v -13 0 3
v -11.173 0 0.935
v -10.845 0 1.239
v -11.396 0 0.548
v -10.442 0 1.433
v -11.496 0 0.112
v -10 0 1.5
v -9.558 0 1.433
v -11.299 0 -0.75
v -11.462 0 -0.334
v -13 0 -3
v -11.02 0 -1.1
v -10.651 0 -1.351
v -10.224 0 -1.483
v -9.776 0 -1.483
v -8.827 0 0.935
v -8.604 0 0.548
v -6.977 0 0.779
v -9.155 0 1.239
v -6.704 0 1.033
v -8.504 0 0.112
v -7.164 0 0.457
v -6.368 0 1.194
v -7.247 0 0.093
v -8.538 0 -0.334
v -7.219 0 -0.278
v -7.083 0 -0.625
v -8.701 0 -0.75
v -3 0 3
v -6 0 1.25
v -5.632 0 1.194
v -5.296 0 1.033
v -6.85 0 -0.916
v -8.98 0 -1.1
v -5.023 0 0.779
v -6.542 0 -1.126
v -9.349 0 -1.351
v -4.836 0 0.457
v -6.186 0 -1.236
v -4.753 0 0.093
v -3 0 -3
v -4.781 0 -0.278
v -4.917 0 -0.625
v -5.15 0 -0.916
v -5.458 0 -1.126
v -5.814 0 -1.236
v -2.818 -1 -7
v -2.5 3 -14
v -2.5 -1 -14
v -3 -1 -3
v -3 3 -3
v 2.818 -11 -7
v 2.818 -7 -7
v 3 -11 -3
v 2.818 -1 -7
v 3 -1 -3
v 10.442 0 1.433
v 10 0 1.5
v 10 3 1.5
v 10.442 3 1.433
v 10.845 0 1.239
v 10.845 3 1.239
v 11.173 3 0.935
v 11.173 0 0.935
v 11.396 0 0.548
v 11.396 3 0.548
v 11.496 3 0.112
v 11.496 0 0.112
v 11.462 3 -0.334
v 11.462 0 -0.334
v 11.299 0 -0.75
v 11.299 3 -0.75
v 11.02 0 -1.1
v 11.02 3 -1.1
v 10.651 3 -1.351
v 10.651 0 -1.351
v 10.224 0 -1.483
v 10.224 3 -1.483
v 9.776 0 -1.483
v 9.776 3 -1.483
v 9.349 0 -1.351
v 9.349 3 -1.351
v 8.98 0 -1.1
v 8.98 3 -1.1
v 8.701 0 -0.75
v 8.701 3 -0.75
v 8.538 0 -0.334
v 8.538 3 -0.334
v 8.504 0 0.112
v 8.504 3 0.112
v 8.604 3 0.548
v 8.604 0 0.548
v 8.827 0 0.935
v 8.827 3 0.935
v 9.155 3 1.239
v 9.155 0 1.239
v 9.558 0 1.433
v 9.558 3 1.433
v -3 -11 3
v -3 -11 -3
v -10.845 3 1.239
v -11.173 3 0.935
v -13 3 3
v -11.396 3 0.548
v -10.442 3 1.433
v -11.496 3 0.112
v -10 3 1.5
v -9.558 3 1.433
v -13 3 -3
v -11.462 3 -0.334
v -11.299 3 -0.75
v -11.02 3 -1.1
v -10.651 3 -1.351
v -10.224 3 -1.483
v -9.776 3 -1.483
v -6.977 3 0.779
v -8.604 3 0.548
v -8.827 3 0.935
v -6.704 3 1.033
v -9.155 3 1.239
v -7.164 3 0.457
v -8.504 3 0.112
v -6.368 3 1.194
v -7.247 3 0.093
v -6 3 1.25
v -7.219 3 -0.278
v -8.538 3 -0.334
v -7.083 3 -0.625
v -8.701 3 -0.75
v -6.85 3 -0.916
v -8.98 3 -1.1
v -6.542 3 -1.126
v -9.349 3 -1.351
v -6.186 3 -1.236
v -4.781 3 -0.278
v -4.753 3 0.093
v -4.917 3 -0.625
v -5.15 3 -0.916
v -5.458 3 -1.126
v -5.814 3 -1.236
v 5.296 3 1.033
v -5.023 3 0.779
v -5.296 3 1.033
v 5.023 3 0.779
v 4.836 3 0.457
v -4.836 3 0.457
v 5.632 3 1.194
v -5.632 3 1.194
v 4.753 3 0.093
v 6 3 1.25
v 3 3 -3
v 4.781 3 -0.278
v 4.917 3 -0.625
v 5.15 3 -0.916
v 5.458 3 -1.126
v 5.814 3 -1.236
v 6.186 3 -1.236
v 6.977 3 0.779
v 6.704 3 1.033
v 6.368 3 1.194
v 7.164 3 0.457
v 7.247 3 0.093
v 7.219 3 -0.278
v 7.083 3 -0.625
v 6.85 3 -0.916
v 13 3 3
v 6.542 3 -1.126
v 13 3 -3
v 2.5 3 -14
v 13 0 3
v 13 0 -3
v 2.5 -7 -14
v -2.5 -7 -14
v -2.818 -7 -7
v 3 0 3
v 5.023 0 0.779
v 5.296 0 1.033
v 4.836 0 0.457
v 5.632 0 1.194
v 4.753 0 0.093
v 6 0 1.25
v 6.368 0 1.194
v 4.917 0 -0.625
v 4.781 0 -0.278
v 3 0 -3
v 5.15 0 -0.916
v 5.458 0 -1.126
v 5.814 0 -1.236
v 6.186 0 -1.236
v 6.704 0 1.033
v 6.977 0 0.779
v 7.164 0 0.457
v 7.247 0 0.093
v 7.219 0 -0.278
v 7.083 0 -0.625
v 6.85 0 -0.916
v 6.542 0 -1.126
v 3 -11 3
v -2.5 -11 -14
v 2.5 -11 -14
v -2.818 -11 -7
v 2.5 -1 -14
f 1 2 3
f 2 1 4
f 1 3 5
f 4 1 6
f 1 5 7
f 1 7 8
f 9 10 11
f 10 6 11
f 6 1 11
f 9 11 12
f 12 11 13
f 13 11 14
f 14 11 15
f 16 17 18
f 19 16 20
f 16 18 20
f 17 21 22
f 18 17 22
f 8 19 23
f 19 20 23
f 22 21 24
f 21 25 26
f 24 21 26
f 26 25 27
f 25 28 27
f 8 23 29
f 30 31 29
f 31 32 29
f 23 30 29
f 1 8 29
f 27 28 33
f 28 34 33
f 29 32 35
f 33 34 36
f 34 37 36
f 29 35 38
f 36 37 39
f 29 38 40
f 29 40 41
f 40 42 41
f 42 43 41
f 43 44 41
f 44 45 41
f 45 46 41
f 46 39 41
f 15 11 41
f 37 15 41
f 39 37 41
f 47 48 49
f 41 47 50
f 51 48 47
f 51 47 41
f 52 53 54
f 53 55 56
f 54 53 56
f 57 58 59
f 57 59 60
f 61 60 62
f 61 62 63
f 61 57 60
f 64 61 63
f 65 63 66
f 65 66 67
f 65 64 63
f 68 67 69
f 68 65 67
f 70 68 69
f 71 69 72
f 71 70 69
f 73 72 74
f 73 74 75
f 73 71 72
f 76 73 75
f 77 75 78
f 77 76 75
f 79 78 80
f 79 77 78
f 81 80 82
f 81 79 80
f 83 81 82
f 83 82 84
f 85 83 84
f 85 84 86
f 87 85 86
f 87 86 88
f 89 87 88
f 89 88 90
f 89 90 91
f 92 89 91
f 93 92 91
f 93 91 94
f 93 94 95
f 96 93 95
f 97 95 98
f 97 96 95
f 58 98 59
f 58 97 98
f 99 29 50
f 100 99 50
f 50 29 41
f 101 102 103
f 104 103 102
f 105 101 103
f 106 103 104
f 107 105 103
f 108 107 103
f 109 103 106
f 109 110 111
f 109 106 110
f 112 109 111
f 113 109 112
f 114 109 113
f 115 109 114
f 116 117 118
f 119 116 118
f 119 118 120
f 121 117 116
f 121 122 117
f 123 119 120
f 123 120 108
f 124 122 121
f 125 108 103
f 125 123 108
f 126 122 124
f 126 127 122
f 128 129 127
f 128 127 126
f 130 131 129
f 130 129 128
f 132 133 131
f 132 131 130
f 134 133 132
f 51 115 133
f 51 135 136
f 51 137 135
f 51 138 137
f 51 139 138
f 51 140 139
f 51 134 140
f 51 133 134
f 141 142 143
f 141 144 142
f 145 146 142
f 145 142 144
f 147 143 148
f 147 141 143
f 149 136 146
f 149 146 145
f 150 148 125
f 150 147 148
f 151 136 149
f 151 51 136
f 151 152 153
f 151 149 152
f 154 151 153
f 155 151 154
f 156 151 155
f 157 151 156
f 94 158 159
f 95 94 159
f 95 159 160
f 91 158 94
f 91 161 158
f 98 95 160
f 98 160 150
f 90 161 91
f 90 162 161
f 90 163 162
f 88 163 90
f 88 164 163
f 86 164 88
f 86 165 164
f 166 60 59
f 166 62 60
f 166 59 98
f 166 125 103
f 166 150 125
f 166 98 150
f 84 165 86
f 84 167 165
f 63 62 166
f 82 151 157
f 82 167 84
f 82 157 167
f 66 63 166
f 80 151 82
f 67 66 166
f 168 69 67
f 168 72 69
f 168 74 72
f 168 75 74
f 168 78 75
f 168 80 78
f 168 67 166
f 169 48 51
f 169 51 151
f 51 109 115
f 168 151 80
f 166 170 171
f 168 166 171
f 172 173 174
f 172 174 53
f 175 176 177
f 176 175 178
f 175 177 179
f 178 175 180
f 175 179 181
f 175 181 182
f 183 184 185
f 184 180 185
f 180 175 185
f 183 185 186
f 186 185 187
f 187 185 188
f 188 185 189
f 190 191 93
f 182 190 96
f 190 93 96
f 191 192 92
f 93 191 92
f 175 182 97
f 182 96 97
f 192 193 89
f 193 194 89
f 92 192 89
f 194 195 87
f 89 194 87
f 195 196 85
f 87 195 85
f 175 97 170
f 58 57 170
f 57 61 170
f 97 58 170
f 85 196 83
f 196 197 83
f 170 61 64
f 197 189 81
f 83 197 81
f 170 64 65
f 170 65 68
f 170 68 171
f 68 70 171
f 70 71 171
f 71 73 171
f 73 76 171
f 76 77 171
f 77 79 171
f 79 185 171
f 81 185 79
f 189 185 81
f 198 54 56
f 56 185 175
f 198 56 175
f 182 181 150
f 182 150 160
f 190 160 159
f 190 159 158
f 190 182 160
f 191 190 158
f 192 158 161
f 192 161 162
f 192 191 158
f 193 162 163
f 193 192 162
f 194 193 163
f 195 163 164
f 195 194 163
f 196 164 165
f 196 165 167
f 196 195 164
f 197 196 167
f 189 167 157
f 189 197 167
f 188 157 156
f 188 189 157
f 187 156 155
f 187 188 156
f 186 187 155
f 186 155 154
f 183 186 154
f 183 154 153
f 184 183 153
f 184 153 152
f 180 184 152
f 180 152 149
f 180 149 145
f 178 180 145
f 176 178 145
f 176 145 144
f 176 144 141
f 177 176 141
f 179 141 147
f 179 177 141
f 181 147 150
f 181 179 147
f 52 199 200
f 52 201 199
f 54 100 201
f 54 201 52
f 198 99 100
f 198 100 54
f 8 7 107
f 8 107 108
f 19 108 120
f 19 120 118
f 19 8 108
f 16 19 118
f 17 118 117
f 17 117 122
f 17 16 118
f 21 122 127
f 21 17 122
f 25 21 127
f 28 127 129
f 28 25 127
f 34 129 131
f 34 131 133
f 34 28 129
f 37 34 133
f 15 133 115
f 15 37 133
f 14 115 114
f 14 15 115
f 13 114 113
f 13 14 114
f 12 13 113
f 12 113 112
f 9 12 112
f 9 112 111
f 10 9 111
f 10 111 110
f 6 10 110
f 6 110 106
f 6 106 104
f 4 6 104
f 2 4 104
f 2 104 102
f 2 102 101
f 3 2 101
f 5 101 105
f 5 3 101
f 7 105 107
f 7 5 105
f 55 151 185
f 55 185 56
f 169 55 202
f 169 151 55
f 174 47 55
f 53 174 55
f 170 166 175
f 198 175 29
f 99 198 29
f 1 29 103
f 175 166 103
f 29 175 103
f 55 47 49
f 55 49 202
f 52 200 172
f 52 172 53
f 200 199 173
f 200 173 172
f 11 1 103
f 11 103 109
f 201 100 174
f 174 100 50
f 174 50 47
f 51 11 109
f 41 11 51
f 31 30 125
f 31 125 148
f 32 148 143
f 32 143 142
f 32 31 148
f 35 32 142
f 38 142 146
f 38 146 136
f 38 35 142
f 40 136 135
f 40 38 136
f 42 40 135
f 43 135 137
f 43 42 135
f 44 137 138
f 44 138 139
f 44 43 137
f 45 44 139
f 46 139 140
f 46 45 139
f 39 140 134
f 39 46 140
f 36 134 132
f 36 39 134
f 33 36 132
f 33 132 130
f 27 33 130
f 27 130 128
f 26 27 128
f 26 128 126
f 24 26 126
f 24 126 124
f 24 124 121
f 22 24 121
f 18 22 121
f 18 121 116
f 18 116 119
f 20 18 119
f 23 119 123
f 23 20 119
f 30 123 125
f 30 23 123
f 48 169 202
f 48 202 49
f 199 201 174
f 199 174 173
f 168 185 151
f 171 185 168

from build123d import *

# Parameters (mm, degrees)
SKETCH_1_W      = 26
SKETCH_1_H      = 6
SKETCH_1_R      = 1.5
SKETCH_1_R_2    = 1.25
EXTRUDE_1_DEPTH = 3
EXTRUDE_2_DEPTH = 4
EXTRUDE_3_DEPTH = 11
EXTRUDE_4_DEPTH = 4


with BuildPart() as part:
    # 草图1 → 凸台-拉伸1 (new body)
    with BuildSketch(Plane(origin=(0, 0, 0), x_dir=(1, 0, 0), z_dir=(0, 1, 0))):
        Rectangle(SKETCH_1_W, SKETCH_1_H)
        with Locations(Location((-10, 0, 0), (0, 0, 270))):
            Circle(SKETCH_1_R, mode=Mode.SUBTRACT)
        with Locations(Location((-6, 0, 0), (0, 0, 270))):
            Circle(SKETCH_1_R_2, mode=Mode.SUBTRACT)
        with Locations(Location((10, 0, 0), (0, 0, 270))):
            Circle(SKETCH_1_R, mode=Mode.SUBTRACT)
        with Locations(Location((6, 0, 0), (0, 0, 270))):
            Circle(SKETCH_1_R_2, mode=Mode.SUBTRACT)
    extrude(amount=EXTRUDE_1_DEPTH)

    # 草图2 → 凸台-拉伸2 (add)
    with BuildSketch(Plane(origin=(0, 3, 0), x_dir=(1, 0, 0), z_dir=(0, 1, 0))):
        Polygon((0, 14), (0, 3), (3, 3), (2.5, 14), align=None)
        Polygon((-3, 3), (0, 3), (0, 14), (-2.5, 14), align=None)
    extrude(amount=-EXTRUDE_2_DEPTH)

    # 草图3 → 凸台-拉伸3 (add)
    with BuildSketch(Plane.XZ):
        Polygon((2.818181818, -7), (3, -3), (0, -3), (0, -7), align=None)
        Polygon((0, -3), (-3, -3), (-2.818181818, -7), (0, -7), align=None)
        Polygon((3, 3), (-3, 3), (-3, -3), (0, -3), (3, -3), align=None)
    extrude(amount=EXTRUDE_3_DEPTH)

    # 草图4 → 凸台-拉伸4 (add)
    with BuildSketch(Plane.XZ.offset(11)):
        Polygon((-2.5, -14), (2.5, -14), (2.818181818, -7), (-2.818181818, -7), align=None)
    extrude(amount=-EXTRUDE_4_DEPTH)


solid = part.part
